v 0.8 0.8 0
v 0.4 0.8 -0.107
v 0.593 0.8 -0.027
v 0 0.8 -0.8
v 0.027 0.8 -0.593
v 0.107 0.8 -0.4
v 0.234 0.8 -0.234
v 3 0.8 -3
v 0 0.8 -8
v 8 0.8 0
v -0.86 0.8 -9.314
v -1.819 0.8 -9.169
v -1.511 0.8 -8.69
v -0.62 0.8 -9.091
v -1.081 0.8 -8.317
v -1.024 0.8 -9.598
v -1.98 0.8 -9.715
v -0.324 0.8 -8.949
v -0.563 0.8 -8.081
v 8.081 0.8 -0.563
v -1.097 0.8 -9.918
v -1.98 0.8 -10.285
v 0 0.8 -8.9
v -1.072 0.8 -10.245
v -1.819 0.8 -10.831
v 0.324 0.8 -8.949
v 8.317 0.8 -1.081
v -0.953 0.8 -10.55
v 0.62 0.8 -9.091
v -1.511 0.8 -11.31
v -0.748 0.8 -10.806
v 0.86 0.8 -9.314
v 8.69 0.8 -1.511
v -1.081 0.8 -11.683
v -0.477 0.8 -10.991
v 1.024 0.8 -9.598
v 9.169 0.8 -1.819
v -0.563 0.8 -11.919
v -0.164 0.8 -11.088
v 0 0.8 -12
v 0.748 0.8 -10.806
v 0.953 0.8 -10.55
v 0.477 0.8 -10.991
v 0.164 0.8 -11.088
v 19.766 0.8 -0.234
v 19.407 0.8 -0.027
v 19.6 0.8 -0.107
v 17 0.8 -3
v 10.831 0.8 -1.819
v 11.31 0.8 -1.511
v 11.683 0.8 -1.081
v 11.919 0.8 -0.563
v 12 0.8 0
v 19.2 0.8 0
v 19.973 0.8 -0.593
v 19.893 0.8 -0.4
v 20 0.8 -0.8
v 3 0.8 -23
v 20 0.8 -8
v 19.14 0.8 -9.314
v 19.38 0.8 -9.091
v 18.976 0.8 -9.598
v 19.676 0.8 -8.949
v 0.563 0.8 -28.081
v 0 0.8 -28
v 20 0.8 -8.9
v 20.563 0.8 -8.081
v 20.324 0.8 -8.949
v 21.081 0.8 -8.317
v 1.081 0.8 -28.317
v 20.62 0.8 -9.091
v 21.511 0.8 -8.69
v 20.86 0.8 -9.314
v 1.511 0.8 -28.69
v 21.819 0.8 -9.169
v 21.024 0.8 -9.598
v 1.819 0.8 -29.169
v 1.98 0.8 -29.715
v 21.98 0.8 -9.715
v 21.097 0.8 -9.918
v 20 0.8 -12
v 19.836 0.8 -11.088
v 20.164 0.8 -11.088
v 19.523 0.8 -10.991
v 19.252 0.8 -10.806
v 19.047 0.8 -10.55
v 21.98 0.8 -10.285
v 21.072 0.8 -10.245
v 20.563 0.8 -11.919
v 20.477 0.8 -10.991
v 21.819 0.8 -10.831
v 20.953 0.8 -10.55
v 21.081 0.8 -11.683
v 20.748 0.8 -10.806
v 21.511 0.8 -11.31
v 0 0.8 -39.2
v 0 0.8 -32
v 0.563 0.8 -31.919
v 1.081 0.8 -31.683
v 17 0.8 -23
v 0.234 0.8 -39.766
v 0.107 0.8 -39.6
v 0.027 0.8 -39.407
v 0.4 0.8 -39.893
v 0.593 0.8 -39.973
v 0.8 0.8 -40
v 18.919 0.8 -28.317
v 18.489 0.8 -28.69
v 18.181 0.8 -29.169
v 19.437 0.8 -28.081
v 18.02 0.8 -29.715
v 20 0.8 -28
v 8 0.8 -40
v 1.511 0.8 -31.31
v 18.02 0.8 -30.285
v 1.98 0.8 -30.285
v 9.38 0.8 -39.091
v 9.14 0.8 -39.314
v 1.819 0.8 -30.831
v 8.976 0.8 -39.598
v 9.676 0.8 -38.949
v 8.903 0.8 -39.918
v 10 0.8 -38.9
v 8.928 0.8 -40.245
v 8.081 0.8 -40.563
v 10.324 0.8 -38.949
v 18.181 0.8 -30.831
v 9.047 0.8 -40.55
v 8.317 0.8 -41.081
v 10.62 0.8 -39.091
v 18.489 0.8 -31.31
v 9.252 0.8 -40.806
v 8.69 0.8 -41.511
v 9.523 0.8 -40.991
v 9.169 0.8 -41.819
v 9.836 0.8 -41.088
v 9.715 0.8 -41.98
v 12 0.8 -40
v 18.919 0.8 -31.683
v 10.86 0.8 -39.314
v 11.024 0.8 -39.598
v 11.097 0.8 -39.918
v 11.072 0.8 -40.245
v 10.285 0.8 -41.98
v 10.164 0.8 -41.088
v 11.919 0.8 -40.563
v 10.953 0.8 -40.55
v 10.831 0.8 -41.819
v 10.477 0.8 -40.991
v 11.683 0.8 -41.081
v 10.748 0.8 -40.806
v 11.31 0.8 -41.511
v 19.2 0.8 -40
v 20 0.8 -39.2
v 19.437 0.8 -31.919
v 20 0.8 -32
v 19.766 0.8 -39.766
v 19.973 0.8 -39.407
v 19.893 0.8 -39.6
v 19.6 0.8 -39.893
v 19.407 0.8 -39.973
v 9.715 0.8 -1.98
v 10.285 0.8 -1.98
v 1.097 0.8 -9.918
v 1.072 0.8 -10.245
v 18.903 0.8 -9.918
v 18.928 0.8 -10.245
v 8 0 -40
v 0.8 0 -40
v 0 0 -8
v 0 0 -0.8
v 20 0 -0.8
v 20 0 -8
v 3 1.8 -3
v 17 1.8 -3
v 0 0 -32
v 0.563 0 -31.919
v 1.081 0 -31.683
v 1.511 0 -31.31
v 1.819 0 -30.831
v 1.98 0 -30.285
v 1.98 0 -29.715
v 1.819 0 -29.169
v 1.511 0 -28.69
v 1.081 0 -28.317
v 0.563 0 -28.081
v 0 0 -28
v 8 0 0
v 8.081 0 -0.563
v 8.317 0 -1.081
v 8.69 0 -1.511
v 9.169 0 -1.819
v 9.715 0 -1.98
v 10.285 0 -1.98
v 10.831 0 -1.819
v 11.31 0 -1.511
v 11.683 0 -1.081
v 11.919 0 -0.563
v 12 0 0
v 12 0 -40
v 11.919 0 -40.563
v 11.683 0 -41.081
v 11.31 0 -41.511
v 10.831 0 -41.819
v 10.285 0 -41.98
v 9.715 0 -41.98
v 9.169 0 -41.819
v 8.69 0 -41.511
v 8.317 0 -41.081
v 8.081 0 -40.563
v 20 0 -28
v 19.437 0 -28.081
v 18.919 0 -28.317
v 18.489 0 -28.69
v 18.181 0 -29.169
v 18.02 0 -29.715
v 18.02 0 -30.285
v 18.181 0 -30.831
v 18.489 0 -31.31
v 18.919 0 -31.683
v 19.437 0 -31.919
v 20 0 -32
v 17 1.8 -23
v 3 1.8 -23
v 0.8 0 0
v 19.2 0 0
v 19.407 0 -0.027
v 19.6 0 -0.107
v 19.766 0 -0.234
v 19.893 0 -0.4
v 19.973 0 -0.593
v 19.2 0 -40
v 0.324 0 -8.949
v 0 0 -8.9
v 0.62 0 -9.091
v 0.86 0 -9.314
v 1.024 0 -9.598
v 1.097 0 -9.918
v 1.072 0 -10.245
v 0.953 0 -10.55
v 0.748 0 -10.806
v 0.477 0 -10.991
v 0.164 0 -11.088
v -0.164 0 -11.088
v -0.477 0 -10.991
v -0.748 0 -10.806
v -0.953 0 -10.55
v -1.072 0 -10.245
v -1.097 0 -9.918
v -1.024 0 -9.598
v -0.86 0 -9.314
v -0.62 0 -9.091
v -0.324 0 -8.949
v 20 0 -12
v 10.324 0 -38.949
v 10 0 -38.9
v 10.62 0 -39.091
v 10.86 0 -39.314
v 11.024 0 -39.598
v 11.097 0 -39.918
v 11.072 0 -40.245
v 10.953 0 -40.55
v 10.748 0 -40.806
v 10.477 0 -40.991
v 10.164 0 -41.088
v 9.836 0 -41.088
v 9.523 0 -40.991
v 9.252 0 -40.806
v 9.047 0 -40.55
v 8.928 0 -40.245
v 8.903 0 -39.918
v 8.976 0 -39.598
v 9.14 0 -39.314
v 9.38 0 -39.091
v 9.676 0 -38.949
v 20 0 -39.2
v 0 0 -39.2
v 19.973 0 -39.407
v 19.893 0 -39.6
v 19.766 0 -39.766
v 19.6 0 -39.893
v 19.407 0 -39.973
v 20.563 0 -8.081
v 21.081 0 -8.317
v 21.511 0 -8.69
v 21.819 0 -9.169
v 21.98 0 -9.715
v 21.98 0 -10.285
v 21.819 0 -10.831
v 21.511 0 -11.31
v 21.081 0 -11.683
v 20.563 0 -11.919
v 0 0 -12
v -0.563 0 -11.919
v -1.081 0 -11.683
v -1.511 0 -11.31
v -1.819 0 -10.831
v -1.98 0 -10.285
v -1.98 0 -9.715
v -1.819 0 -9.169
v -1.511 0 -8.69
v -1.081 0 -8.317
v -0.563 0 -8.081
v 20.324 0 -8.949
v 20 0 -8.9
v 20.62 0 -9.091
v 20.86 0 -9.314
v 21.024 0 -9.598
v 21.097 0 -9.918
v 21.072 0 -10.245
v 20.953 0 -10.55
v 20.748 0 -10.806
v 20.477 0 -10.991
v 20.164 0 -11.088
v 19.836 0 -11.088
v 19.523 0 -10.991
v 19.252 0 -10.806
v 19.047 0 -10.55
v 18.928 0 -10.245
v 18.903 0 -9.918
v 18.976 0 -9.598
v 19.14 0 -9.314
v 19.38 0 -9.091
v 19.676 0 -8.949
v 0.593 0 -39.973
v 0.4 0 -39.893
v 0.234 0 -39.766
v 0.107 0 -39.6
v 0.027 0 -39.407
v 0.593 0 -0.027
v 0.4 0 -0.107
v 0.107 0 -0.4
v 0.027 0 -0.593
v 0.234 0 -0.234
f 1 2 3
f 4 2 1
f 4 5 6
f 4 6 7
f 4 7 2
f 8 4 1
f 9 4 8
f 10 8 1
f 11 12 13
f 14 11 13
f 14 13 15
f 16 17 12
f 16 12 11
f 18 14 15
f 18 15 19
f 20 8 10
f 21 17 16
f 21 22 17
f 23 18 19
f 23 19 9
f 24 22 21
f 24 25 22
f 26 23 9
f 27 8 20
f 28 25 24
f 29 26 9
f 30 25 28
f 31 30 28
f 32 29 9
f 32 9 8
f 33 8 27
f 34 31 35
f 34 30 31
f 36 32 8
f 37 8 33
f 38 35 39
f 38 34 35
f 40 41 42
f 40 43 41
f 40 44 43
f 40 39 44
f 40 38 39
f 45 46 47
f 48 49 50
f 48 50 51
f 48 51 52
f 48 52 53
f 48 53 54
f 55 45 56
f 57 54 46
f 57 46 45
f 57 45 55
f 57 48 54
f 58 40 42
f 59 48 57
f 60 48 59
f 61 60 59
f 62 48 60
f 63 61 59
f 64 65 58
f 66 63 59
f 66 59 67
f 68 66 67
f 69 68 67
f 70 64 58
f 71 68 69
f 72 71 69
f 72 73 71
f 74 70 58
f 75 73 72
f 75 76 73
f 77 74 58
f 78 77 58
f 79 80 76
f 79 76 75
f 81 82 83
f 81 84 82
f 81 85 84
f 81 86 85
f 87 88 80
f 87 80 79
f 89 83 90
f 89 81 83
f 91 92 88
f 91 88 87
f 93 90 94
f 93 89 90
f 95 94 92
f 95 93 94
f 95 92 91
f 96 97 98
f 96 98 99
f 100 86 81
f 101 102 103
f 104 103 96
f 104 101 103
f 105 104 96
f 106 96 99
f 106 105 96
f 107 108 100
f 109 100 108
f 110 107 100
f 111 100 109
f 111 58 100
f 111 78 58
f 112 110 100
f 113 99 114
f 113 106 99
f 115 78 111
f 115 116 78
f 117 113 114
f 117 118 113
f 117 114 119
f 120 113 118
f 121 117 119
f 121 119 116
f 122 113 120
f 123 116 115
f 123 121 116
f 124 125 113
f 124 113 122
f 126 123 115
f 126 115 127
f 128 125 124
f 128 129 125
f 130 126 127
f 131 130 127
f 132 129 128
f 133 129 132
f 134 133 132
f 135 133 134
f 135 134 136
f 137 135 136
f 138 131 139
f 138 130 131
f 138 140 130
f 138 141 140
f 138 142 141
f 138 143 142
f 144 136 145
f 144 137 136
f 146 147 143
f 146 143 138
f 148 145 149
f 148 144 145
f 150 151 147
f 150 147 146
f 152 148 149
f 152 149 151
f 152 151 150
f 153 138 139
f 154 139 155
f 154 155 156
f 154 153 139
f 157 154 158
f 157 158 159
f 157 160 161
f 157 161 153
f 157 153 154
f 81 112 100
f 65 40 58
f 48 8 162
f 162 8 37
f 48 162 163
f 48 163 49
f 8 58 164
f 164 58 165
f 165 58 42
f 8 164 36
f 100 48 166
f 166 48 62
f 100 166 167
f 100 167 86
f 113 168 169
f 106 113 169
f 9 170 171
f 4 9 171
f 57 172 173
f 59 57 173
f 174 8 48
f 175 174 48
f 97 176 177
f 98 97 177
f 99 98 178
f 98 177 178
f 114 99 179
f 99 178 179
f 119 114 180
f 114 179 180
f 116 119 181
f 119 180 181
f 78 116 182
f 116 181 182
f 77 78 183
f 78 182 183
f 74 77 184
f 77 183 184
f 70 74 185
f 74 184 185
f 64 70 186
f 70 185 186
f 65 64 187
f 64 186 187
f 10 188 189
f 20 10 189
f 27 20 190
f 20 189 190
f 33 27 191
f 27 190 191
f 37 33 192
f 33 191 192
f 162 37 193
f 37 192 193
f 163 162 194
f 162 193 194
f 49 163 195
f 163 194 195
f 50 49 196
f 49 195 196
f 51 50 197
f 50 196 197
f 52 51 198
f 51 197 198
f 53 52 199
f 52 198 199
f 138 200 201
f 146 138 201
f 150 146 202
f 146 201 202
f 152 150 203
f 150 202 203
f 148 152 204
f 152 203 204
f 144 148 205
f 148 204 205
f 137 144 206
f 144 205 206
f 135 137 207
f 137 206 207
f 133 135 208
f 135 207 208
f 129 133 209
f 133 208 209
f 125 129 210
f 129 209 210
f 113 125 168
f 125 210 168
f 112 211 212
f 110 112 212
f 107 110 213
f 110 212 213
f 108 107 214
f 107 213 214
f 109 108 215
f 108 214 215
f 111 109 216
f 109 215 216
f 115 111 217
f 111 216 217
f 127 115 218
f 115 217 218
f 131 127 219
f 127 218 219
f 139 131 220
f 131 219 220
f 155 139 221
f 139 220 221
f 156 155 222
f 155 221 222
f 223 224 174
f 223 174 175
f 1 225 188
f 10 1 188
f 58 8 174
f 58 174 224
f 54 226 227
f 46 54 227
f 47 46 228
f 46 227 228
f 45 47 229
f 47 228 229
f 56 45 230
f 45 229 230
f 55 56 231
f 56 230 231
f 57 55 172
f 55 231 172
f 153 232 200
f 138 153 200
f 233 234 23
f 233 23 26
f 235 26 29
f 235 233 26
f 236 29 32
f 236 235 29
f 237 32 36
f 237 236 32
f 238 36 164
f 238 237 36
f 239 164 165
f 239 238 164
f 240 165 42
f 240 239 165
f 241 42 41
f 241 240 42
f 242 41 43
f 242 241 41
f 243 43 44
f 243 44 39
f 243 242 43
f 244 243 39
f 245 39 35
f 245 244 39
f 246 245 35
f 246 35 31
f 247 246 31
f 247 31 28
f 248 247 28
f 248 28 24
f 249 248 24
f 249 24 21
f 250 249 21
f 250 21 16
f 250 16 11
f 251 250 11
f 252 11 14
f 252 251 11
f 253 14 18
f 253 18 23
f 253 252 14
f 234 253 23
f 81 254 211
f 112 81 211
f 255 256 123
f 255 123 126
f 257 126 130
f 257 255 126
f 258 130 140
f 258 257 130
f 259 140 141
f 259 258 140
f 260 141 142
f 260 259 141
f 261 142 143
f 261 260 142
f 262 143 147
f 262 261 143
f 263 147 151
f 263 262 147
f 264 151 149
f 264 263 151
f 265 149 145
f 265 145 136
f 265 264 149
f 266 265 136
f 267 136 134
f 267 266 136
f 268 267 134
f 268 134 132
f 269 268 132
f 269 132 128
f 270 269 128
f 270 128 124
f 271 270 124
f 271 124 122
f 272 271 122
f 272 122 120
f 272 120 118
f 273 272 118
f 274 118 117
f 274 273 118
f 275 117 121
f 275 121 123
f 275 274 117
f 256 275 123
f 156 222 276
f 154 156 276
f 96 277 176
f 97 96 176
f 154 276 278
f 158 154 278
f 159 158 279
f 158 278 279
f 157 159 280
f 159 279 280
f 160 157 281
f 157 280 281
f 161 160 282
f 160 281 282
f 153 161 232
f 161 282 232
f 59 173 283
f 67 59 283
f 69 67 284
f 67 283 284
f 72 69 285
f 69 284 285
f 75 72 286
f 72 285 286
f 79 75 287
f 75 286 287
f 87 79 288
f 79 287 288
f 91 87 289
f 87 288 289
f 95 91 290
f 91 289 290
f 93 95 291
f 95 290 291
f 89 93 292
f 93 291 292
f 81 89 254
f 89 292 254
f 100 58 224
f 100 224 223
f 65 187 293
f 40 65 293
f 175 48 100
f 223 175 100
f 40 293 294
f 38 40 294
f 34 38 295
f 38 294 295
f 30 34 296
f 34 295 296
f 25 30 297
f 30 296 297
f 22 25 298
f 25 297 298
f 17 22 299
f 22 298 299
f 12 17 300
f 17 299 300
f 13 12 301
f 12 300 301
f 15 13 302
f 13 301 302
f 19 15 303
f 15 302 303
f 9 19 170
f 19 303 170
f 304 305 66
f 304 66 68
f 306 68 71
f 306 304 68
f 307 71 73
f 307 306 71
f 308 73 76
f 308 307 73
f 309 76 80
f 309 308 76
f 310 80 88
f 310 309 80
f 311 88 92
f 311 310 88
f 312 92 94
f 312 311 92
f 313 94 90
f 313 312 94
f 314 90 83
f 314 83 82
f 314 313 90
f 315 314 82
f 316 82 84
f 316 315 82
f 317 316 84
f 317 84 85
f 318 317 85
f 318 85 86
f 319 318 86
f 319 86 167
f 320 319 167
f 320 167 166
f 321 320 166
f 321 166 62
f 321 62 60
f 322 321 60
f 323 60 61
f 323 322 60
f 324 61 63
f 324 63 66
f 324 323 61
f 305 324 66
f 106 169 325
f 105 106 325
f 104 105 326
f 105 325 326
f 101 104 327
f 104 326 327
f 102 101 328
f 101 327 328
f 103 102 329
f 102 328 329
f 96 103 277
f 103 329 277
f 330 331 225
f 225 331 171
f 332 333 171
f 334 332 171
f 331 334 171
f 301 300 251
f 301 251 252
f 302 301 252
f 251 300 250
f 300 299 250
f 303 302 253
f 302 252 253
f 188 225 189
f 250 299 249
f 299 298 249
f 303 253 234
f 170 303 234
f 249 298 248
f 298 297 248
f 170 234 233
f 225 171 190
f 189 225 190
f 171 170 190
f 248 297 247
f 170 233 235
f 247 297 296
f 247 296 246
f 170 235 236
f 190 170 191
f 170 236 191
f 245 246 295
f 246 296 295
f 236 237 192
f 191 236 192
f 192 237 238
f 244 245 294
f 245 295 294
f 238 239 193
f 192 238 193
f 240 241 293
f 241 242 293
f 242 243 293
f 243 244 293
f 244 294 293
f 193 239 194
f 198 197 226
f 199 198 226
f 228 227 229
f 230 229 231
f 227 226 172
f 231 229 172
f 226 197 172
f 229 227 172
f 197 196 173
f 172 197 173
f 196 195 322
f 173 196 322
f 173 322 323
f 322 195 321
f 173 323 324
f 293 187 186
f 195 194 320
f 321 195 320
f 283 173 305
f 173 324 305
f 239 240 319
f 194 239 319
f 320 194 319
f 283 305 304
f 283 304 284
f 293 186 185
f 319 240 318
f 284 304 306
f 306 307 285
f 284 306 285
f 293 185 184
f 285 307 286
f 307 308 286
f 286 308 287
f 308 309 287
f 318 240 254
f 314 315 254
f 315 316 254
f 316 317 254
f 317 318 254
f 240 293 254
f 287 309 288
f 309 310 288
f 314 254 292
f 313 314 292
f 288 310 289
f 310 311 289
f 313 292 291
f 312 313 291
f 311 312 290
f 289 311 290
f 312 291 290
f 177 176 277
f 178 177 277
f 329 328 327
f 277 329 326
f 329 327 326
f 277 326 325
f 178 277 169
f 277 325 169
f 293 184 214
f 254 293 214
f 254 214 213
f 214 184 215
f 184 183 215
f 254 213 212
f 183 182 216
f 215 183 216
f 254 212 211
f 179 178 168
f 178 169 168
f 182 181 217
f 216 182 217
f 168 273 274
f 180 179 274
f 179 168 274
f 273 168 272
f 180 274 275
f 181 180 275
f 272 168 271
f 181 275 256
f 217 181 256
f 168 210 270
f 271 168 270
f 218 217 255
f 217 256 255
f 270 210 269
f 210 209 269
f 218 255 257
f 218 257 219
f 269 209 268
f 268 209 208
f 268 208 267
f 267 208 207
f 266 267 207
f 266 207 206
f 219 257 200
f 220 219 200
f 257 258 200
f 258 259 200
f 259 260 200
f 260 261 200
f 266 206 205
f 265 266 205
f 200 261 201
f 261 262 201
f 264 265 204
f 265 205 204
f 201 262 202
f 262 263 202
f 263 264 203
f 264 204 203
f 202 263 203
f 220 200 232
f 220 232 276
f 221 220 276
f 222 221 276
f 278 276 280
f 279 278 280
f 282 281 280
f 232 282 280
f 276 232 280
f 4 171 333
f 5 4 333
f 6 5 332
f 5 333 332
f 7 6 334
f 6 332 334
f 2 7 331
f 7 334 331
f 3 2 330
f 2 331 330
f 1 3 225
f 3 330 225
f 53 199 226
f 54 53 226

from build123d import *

# Parameters (mm, degrees)
SKETCH1_R      = 1.1
BOARD_DEPTH    = 0.8
ESQUISSE1_W    = 14
ESQUISSE1_H    = 20
CAPTEURS_DEPTH = 1


with BuildPart() as part:
    # Sketch1 → Board (new body)
    with BuildSketch(Plane(origin=(0, 0, 0), x_dir=(1, 0, 0), z_dir=(0, 1, 0))):
        with BuildLine():
            Line((0.8, 0), (8, 0))
            ThreePointArc((8, 0), (10, 2), (12, 0))
            Line((12, 0), (19.2, 0))
            ThreePointArc((19.2, 0), (19.765685425, 0.234314575), (20, 0.8))
            Line((20, 0.8), (20, 8))
            ThreePointArc((20, 8), (22, 10), (20, 12))
            Line((20, 12), (20, 28))
            ThreePointArc((20, 28), (18, 30), (20, 32))
            Line((20, 32), (20, 39.2))
            ThreePointArc((20, 39.2), (19.765685425, 39.765685425), (19.2, 40))
            Line((19.2, 40), (12, 40))
            ThreePointArc((12, 40), (10, 42), (8, 40))
            Line((8, 40), (0.8, 40))
            ThreePointArc((0.8, 40), (0.234314575, 39.765685425), (0, 39.2))
            Line((0, 39.2), (0, 32))
            ThreePointArc((0, 32), (2, 30), (0, 28))
            Line((0, 28), (0, 12))
            ThreePointArc((0, 12), (-2, 10), (0, 8))
            Line((0, 8), (0, 0.8))
            ThreePointArc((0, 0.8), (0.234314575, 0.234314575), (0.8, 0))
        make_face()
        with Locations(Location((10, 40, 0), (0, 0, 270))):
            Circle(SKETCH1_R, mode=Mode.SUBTRACT)
        with Locations(Location((0, 10, 0), (0, 0, 270))):
            Circle(SKETCH1_R, mode=Mode.SUBTRACT)
        with Locations(Location((20, 10, 0), (0, 0, 270))):
            Circle(SKETCH1_R, mode=Mode.SUBTRACT)
    extrude(amount=BOARD_DEPTH)

    # Esquisse1 → Capteurs (add)
    with BuildSketch(Plane(origin=(0, 0.8, 0), x_dir=(1, 0, 0), z_dir=(0, 1, 0))):
        with Locations((10, 13)):
            Rectangle(ESQUISSE1_W, ESQUISSE1_H)
    extrude(amount=CAPTEURS_DEPTH)


solid = part.part
